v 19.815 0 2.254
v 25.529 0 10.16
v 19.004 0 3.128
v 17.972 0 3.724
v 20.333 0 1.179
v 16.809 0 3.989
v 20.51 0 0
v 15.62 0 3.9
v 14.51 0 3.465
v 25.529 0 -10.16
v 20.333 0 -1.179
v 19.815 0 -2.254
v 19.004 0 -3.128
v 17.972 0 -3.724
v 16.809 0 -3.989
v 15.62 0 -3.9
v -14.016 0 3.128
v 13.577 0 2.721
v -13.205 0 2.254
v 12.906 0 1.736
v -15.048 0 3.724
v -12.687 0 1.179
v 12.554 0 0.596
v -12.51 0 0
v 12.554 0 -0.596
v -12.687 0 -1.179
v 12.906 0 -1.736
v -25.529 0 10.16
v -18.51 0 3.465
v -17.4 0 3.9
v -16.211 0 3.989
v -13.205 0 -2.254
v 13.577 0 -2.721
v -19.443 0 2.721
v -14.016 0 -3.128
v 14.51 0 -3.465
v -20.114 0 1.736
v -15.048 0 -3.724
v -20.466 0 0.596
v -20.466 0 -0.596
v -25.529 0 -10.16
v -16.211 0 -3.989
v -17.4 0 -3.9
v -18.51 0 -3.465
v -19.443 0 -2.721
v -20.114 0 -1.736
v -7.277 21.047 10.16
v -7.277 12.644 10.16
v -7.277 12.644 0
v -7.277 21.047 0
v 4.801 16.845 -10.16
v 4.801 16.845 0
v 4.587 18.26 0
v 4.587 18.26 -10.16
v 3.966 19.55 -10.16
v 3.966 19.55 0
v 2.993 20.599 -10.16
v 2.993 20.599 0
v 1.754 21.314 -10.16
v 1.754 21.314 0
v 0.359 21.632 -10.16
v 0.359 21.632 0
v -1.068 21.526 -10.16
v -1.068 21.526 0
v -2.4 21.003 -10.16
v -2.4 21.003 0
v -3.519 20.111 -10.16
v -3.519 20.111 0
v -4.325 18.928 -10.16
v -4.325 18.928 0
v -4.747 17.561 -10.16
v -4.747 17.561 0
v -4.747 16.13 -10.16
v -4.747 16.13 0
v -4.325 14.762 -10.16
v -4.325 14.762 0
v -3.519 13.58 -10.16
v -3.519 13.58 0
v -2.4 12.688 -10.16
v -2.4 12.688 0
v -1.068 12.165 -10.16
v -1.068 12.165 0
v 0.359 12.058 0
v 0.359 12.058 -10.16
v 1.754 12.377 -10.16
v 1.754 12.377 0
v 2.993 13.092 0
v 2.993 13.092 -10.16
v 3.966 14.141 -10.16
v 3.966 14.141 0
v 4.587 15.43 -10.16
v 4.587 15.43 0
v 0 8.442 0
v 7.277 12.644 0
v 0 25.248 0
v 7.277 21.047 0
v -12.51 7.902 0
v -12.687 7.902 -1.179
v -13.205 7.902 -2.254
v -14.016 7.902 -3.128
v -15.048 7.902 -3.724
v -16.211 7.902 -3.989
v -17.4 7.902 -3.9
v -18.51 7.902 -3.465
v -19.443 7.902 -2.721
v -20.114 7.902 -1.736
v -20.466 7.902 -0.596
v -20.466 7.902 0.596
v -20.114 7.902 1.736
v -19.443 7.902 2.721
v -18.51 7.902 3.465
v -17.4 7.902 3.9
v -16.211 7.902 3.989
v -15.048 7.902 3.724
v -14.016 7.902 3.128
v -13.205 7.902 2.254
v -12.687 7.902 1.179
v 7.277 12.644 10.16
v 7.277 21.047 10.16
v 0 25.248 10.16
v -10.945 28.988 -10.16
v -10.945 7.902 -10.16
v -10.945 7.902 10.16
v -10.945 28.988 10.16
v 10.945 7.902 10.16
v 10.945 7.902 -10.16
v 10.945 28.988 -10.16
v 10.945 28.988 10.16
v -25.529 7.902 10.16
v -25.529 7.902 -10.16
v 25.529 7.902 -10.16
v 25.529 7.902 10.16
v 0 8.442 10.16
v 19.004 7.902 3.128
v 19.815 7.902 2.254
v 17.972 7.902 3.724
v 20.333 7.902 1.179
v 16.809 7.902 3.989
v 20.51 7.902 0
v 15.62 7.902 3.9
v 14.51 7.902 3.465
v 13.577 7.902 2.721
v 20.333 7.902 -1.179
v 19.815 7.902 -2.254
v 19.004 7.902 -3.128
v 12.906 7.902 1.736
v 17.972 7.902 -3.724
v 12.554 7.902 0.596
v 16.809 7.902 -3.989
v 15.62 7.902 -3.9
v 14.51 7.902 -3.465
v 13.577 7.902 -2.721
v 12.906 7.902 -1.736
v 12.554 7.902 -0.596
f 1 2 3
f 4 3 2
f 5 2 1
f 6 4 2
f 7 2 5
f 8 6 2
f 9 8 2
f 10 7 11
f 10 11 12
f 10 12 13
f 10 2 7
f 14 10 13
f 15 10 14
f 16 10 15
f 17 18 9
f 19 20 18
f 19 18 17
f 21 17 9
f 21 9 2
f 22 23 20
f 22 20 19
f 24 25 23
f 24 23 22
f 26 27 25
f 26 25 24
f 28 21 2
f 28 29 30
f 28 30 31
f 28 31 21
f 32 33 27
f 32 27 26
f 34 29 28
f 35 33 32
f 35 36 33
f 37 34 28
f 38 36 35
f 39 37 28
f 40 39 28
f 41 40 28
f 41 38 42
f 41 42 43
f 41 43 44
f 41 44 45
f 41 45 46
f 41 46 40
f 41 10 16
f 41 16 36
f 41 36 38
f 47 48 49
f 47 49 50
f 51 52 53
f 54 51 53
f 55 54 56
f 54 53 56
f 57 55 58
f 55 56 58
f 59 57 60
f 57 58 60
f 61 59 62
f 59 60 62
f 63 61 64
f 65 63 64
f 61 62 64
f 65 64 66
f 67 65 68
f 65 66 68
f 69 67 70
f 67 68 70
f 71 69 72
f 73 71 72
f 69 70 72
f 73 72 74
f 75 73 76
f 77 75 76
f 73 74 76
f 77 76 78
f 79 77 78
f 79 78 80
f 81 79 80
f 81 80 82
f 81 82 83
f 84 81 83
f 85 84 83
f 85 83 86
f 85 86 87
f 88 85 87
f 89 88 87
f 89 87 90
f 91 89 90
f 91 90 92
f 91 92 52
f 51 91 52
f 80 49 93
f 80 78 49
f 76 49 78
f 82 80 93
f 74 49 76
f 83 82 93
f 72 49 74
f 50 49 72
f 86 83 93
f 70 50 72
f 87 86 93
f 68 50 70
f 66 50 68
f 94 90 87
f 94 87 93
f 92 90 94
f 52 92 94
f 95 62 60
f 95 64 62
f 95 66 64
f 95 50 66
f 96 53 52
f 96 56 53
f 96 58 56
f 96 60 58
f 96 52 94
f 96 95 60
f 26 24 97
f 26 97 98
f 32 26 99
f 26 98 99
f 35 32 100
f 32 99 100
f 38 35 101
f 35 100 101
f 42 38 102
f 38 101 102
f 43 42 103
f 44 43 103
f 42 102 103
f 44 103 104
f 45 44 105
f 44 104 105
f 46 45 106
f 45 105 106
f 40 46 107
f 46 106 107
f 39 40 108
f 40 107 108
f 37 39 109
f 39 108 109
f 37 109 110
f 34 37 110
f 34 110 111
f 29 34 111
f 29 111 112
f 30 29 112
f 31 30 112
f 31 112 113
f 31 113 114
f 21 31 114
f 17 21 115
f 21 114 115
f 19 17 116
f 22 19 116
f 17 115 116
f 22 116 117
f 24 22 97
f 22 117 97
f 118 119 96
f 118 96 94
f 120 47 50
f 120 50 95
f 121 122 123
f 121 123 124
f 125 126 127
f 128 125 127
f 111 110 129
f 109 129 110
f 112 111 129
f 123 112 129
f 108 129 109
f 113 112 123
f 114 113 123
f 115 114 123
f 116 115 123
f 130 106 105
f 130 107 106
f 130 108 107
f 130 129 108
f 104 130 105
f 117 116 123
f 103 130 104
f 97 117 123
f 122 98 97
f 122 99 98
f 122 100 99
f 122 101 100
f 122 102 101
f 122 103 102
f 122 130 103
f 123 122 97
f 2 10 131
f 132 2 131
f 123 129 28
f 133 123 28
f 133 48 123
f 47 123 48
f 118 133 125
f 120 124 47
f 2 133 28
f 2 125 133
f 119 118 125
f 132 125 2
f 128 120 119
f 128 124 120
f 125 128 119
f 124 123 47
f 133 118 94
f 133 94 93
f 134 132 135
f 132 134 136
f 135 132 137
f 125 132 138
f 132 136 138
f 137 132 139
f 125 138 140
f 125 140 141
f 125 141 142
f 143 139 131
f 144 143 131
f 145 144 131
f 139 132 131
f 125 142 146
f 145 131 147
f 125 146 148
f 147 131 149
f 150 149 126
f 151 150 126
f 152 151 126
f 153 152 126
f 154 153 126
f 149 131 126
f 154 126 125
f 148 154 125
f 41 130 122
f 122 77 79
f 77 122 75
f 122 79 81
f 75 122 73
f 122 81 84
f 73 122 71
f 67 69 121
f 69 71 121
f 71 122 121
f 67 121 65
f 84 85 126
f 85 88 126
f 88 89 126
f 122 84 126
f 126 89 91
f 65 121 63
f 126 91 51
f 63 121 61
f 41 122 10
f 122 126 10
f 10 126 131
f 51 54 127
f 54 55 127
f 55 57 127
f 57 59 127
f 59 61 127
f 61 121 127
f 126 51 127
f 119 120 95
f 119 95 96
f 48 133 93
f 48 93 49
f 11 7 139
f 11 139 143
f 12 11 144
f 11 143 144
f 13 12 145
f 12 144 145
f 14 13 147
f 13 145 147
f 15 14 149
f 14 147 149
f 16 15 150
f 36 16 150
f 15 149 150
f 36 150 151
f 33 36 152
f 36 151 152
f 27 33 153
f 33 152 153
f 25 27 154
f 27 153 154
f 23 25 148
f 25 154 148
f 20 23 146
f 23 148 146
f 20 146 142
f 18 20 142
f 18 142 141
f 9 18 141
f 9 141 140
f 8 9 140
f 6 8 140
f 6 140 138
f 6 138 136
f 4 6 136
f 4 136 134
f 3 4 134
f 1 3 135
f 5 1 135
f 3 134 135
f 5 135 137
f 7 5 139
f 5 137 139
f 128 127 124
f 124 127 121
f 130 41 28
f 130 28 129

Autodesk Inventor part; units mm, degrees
ref_plane "YZ Plane" through (0, 0, 0) normal (1, 0, 0) x (0, 1, 0)
ref_plane "XZ Plane" through (0, 0, 0) normal (0, 1, 0) x (-1, 0, 0)
ref_plane "XY Plane" through (0, 0, 0) normal (0, 0, 1) x (1, 0, 0)
sketch "Sketch1" plane through (0, 0, 0) normal (0, 0, 1) x (1, 0, 0)
  line L0 (0, 0) -> (-25.5293, 0)
  line L1 (-25.5293, 0) -> (-25.5293, 7.9022)
  line L2 (-25.5293, 7.9022) -> (-10.9446, 7.9022)
  line L3 (-10.9446, 7.9022) -> (-10.9446, 28.9877)
  line L4 (0, -5.7975) -> (0, 34.7852) projected
  line L5 (0, 0) -> (25.5293, 0)
  line L6 (25.5293, 0) -> (25.5293, 7.9022)
  line L7 (25.5293, 7.9022) -> (10.9446, 7.9022)
  line L8 (10.9446, 7.9022) -> (10.9446, 28.9877)
  line L9 (10.9446, 28.9877) -> (-10.9446, 28.9877)
extrude "Extrusion1" add sketch "Sketch1" along normal mid plane 20.32
sketch "Sketch2" plane through (0, 0, 10.16) normal (0, 0, 1) x (1, 0, 0)
  line L0 (-10.9446, 7.9022) -> (-25.5293, 7.9022) projected
  line L1 (-25.5293, 7.9022) -> (-25.5293, 0) projected
  line L2 (-25.5293, 0) -> (25.5293, 0) projected
  line L3 (25.5293, 0) -> (25.5293, 7.9022) projected
  line L4 (25.5293, 7.9022) -> (10.9446, 7.9022) projected
  line L5 (10.9446, 7.9022) -> (10.9446, 28.9877) projected
  line L6 (10.9446, 28.9877) -> (-10.9446, 28.9877) projected
  line L7 (-10.9446, 28.9877) -> (-10.9446, 7.9022) projected
  line L8 (0, -6.2231) -> (0, 37.3386) projected
  line L9 (0, 25.2482) -> (7.2771, 21.0468)
  line L10 (7.2771, 21.0468) -> (7.2771, 12.6439)
  line L11 (7.2771, 12.6439) -> (0, 8.4425)
  line L12 (0, 8.4425) -> (-7.2771, 12.6439)
  line L13 (-7.2771, 12.6439) -> (-7.2771, 21.0468)
  line L14 (-7.2771, 21.0468) -> (0, 25.2482)
  circle A0 centre (0, 16.8453) radius 4.8006
  point P0 (0, 0)
  dimension "d5" = 14.5542
  dimension "d6" = 9.6012
extrude "Extrusion2" cut sketch "Sketch2" against normal through all contours A0 L8 | L8 A0
extrude "Extrusion3" cut sketch "Sketch2" against normal blind 10.16 contours L9 L10 L11 L8 A0 | L8 A0 L12 L13 L14
sketch "Sketch3" plane through (-25.5293, 7.9022, 10.16) normal (0, 1, 0) x (1, 0, 0)
  line L0 (0, 20.32) -> (0, 0) projected
  line L1 (14.5848, 0) -> (0, 0) projected
  line L2 (14.5848, 20.32) -> (14.5848, 0) projected
  line L3 (0, 20.32) -> (14.5848, 20.32) projected
  line L4 (36.4739, 20.32) -> (36.4739, 0) projected
  line L5 (51.0586, 0) -> (36.4739, 0) projected
  line L6 (51.0586, 20.32) -> (51.0586, 0) projected
  line L7 (36.4739, 20.32) -> (51.0586, 20.32) projected
  circle A0 centre (9.0193, 10.16) radius 4.0005
  line L8 (14.5848, 20.32) -> (14.5848, 0) projected
  line L9 (36.4739, 0) -> (14.5848, 0) projected
  line L10 (36.4739, 20.32) -> (36.4739, 0) projected
  line L11 (14.5848, 20.32) -> (36.4739, 20.32) projected
  line L12 (25.5293, 24.384) -> (25.5293, -4.064) projected
  circle A1 centre (42.0393, 10.16) radius 4.0005
  point P0 (25.5293, 10.16)
  point P1 (0, 10.16)
  dimension "d11" = 8.001
  dimension "d15" = 33.02
extrude "Extrusion4" cut sketch "Sketch3" against normal through all contours A0 | A1
properties part number "y_axis_lead_screw_insert"
